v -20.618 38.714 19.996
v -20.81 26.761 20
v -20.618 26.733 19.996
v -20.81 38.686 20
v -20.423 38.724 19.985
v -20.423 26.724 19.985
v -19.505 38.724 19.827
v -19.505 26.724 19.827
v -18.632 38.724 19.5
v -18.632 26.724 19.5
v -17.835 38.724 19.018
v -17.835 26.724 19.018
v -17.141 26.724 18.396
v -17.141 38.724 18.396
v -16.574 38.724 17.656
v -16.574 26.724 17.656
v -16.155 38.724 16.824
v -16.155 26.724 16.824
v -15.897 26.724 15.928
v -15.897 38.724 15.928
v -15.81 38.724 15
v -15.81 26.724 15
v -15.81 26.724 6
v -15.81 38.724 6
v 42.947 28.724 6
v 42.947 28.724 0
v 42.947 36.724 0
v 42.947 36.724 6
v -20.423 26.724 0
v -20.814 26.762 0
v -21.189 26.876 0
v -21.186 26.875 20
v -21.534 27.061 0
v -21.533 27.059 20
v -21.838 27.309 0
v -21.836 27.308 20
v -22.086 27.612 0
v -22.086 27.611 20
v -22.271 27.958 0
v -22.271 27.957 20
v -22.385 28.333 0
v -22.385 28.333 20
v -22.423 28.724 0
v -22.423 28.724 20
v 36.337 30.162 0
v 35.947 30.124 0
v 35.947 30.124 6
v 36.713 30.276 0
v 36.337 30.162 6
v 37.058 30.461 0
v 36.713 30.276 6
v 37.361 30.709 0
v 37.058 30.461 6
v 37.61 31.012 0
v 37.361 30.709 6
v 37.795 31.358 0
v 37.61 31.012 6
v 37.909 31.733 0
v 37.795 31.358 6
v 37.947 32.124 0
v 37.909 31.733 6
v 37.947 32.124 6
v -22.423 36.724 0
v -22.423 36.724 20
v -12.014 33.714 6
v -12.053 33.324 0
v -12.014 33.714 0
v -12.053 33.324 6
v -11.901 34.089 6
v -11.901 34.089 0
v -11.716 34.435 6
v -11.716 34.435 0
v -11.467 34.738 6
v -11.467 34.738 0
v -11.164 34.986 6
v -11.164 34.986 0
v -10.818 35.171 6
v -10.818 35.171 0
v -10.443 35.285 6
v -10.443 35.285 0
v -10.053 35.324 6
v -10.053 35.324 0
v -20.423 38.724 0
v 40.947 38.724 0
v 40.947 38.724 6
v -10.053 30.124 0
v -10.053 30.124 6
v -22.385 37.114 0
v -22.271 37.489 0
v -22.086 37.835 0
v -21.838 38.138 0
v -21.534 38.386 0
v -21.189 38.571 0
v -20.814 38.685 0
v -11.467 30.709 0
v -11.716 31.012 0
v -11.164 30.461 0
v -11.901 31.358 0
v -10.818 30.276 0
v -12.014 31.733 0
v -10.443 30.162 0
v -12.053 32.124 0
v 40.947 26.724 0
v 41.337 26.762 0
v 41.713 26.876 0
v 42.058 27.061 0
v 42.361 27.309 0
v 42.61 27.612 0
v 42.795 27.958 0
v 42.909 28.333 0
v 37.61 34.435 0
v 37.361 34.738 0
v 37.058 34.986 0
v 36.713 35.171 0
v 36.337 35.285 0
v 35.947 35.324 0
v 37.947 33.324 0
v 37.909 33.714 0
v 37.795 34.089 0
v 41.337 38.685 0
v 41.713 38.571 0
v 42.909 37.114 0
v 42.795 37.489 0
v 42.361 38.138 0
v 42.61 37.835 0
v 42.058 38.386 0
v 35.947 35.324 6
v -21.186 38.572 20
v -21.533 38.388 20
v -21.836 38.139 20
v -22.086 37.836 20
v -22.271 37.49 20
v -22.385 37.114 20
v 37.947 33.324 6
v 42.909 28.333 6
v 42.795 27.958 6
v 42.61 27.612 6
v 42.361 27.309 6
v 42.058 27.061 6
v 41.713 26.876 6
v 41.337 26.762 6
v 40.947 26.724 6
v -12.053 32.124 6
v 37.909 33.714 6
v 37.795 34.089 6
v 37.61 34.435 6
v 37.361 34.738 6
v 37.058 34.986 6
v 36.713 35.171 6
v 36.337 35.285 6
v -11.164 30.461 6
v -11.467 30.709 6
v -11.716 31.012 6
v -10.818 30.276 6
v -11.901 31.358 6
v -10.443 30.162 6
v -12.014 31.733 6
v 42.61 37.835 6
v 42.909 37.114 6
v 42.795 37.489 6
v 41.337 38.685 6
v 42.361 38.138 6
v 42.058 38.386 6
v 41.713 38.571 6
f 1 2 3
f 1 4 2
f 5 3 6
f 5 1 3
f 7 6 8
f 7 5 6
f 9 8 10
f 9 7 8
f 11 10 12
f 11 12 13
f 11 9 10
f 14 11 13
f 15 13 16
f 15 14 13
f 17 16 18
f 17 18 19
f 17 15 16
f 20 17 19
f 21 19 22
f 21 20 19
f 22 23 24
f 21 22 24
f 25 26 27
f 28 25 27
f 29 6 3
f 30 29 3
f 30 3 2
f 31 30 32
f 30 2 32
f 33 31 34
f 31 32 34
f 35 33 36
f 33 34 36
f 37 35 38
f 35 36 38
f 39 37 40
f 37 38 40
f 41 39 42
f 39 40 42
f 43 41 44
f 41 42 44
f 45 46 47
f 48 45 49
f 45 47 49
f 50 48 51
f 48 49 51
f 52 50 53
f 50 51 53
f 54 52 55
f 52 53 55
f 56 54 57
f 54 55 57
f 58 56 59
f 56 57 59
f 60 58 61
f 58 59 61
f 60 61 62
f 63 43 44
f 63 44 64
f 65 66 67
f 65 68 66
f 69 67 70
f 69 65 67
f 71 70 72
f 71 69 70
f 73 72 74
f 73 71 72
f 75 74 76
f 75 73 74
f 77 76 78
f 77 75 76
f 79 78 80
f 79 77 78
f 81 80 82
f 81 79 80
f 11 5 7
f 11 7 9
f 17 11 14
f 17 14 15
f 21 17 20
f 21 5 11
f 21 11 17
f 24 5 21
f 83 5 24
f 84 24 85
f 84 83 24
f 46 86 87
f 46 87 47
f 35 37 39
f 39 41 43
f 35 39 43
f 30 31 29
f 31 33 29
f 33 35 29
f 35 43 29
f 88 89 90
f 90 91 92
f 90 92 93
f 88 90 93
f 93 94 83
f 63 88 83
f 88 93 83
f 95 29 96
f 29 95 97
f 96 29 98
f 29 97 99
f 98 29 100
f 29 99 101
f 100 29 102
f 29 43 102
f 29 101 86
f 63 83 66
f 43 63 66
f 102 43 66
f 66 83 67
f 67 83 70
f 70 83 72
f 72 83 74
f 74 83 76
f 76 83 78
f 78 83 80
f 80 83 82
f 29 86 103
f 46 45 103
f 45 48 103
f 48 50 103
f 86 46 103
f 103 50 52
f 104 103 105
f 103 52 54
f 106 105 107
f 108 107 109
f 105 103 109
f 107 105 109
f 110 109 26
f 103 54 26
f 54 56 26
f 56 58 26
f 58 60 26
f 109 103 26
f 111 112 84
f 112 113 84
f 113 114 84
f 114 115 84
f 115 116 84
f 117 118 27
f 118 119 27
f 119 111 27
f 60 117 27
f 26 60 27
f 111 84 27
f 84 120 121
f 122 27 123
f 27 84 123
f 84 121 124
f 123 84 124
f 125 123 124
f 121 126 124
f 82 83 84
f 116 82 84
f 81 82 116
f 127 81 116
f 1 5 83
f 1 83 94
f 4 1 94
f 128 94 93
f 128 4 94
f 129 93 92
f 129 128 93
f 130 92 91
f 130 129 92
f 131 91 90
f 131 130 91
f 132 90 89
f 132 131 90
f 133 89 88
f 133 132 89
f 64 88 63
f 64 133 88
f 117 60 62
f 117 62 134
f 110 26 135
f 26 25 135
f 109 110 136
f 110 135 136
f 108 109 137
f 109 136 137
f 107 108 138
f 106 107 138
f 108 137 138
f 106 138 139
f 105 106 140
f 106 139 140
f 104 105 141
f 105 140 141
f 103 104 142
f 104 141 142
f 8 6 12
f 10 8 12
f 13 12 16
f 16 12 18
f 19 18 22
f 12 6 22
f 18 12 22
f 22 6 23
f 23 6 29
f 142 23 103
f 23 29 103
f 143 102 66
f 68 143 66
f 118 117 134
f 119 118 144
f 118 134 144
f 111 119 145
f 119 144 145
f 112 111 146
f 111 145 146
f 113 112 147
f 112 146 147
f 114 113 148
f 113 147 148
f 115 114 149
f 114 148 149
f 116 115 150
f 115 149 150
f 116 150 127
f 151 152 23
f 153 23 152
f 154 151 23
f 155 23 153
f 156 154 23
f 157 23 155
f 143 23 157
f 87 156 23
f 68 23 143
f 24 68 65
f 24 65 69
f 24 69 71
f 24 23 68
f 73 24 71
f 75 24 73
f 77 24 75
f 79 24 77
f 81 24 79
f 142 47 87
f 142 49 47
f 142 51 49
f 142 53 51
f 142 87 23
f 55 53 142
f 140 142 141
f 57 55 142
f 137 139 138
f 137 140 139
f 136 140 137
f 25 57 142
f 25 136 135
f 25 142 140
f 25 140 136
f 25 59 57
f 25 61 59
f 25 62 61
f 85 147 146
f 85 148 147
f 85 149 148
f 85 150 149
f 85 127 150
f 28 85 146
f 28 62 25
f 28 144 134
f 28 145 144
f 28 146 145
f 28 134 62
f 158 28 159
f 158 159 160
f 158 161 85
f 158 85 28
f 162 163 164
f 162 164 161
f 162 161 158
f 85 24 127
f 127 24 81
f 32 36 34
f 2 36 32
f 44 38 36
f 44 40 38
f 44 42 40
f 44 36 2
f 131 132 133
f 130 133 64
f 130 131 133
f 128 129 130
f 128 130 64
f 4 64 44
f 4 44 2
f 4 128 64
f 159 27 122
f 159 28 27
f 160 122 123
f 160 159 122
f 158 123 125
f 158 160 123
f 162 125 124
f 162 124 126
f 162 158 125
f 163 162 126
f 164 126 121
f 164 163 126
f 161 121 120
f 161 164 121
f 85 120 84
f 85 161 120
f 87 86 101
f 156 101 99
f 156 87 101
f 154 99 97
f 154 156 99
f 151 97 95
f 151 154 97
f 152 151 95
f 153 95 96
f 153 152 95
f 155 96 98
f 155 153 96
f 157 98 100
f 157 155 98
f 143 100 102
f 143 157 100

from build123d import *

# Parameters (mm, degrees)
F0_W     = 58.757578
F0_H     = 12
F0_W_2   = 50
F0_H_2   = 5.2
F1_DEPTH = 6
F0_W_3   = 6.612889
F2_DEPTH = 20
F3_R     = 2
F4_R     = 2
F5_R     = 2
F6_R     = 2
F7_R     = 5


with BuildPart() as f1:
    # F0 (on Top) → F1 (new body)
    with BuildSketch(Plane.XY):
        with Locations((13.568355, 32.723509)):
            Rectangle(F0_W, F0_H)
        with Locations((12.947144, 32.723509)):
            Rectangle(F0_W_2, F0_H_2, mode=Mode.SUBTRACT)
    extrude(amount=F1_DEPTH)

    # F0 (on Top) → F2 (join)
    with BuildSketch(Plane.XY):
        with Locations((-19.116878, 32.723509)):
            Rectangle(F0_W_3, F0_H)
    extrude(amount=F2_DEPTH)

    # F3
    f3_edges = [f1.edges().sort_by_distance(p)[0] for p in [
        (42.947144, 26.723509, 3),
    ]]
    fillet(f3_edges, radius=F3_R)

    # F4
    f4_edges = [f1.edges().sort_by_distance(p)[0] for p in [
        (42.947144, 38.723509, 3),
    ]]
    fillet(f4_edges, radius=F4_R)

    # F5
    f5_edges = [f1.edges().sort_by_distance(p)[0] for p in [
        (-12.052856, 35.323509, 3),
        (37.947144, 35.323509, 3),
        (37.947144, 30.123509, 3),
        (-12.052856, 30.123509, 3),
    ]]
    fillet(f5_edges, radius=F5_R)

    # F6
    f6_edges = [f1.edges().sort_by_distance(p)[0] for p in [
        (-22.423323, 38.723509, 10),
        (-22.423323, 26.723509, 10),
    ]]
    fillet(f6_edges, radius=F6_R)

    # F7
    f7_edges = [f1.edges().sort_by_distance(p)[0] for p in [
        (-15.810434, 32.723509, 20),
    ]]
    fillet(f7_edges, radius=F7_R)


solid = f1.part
